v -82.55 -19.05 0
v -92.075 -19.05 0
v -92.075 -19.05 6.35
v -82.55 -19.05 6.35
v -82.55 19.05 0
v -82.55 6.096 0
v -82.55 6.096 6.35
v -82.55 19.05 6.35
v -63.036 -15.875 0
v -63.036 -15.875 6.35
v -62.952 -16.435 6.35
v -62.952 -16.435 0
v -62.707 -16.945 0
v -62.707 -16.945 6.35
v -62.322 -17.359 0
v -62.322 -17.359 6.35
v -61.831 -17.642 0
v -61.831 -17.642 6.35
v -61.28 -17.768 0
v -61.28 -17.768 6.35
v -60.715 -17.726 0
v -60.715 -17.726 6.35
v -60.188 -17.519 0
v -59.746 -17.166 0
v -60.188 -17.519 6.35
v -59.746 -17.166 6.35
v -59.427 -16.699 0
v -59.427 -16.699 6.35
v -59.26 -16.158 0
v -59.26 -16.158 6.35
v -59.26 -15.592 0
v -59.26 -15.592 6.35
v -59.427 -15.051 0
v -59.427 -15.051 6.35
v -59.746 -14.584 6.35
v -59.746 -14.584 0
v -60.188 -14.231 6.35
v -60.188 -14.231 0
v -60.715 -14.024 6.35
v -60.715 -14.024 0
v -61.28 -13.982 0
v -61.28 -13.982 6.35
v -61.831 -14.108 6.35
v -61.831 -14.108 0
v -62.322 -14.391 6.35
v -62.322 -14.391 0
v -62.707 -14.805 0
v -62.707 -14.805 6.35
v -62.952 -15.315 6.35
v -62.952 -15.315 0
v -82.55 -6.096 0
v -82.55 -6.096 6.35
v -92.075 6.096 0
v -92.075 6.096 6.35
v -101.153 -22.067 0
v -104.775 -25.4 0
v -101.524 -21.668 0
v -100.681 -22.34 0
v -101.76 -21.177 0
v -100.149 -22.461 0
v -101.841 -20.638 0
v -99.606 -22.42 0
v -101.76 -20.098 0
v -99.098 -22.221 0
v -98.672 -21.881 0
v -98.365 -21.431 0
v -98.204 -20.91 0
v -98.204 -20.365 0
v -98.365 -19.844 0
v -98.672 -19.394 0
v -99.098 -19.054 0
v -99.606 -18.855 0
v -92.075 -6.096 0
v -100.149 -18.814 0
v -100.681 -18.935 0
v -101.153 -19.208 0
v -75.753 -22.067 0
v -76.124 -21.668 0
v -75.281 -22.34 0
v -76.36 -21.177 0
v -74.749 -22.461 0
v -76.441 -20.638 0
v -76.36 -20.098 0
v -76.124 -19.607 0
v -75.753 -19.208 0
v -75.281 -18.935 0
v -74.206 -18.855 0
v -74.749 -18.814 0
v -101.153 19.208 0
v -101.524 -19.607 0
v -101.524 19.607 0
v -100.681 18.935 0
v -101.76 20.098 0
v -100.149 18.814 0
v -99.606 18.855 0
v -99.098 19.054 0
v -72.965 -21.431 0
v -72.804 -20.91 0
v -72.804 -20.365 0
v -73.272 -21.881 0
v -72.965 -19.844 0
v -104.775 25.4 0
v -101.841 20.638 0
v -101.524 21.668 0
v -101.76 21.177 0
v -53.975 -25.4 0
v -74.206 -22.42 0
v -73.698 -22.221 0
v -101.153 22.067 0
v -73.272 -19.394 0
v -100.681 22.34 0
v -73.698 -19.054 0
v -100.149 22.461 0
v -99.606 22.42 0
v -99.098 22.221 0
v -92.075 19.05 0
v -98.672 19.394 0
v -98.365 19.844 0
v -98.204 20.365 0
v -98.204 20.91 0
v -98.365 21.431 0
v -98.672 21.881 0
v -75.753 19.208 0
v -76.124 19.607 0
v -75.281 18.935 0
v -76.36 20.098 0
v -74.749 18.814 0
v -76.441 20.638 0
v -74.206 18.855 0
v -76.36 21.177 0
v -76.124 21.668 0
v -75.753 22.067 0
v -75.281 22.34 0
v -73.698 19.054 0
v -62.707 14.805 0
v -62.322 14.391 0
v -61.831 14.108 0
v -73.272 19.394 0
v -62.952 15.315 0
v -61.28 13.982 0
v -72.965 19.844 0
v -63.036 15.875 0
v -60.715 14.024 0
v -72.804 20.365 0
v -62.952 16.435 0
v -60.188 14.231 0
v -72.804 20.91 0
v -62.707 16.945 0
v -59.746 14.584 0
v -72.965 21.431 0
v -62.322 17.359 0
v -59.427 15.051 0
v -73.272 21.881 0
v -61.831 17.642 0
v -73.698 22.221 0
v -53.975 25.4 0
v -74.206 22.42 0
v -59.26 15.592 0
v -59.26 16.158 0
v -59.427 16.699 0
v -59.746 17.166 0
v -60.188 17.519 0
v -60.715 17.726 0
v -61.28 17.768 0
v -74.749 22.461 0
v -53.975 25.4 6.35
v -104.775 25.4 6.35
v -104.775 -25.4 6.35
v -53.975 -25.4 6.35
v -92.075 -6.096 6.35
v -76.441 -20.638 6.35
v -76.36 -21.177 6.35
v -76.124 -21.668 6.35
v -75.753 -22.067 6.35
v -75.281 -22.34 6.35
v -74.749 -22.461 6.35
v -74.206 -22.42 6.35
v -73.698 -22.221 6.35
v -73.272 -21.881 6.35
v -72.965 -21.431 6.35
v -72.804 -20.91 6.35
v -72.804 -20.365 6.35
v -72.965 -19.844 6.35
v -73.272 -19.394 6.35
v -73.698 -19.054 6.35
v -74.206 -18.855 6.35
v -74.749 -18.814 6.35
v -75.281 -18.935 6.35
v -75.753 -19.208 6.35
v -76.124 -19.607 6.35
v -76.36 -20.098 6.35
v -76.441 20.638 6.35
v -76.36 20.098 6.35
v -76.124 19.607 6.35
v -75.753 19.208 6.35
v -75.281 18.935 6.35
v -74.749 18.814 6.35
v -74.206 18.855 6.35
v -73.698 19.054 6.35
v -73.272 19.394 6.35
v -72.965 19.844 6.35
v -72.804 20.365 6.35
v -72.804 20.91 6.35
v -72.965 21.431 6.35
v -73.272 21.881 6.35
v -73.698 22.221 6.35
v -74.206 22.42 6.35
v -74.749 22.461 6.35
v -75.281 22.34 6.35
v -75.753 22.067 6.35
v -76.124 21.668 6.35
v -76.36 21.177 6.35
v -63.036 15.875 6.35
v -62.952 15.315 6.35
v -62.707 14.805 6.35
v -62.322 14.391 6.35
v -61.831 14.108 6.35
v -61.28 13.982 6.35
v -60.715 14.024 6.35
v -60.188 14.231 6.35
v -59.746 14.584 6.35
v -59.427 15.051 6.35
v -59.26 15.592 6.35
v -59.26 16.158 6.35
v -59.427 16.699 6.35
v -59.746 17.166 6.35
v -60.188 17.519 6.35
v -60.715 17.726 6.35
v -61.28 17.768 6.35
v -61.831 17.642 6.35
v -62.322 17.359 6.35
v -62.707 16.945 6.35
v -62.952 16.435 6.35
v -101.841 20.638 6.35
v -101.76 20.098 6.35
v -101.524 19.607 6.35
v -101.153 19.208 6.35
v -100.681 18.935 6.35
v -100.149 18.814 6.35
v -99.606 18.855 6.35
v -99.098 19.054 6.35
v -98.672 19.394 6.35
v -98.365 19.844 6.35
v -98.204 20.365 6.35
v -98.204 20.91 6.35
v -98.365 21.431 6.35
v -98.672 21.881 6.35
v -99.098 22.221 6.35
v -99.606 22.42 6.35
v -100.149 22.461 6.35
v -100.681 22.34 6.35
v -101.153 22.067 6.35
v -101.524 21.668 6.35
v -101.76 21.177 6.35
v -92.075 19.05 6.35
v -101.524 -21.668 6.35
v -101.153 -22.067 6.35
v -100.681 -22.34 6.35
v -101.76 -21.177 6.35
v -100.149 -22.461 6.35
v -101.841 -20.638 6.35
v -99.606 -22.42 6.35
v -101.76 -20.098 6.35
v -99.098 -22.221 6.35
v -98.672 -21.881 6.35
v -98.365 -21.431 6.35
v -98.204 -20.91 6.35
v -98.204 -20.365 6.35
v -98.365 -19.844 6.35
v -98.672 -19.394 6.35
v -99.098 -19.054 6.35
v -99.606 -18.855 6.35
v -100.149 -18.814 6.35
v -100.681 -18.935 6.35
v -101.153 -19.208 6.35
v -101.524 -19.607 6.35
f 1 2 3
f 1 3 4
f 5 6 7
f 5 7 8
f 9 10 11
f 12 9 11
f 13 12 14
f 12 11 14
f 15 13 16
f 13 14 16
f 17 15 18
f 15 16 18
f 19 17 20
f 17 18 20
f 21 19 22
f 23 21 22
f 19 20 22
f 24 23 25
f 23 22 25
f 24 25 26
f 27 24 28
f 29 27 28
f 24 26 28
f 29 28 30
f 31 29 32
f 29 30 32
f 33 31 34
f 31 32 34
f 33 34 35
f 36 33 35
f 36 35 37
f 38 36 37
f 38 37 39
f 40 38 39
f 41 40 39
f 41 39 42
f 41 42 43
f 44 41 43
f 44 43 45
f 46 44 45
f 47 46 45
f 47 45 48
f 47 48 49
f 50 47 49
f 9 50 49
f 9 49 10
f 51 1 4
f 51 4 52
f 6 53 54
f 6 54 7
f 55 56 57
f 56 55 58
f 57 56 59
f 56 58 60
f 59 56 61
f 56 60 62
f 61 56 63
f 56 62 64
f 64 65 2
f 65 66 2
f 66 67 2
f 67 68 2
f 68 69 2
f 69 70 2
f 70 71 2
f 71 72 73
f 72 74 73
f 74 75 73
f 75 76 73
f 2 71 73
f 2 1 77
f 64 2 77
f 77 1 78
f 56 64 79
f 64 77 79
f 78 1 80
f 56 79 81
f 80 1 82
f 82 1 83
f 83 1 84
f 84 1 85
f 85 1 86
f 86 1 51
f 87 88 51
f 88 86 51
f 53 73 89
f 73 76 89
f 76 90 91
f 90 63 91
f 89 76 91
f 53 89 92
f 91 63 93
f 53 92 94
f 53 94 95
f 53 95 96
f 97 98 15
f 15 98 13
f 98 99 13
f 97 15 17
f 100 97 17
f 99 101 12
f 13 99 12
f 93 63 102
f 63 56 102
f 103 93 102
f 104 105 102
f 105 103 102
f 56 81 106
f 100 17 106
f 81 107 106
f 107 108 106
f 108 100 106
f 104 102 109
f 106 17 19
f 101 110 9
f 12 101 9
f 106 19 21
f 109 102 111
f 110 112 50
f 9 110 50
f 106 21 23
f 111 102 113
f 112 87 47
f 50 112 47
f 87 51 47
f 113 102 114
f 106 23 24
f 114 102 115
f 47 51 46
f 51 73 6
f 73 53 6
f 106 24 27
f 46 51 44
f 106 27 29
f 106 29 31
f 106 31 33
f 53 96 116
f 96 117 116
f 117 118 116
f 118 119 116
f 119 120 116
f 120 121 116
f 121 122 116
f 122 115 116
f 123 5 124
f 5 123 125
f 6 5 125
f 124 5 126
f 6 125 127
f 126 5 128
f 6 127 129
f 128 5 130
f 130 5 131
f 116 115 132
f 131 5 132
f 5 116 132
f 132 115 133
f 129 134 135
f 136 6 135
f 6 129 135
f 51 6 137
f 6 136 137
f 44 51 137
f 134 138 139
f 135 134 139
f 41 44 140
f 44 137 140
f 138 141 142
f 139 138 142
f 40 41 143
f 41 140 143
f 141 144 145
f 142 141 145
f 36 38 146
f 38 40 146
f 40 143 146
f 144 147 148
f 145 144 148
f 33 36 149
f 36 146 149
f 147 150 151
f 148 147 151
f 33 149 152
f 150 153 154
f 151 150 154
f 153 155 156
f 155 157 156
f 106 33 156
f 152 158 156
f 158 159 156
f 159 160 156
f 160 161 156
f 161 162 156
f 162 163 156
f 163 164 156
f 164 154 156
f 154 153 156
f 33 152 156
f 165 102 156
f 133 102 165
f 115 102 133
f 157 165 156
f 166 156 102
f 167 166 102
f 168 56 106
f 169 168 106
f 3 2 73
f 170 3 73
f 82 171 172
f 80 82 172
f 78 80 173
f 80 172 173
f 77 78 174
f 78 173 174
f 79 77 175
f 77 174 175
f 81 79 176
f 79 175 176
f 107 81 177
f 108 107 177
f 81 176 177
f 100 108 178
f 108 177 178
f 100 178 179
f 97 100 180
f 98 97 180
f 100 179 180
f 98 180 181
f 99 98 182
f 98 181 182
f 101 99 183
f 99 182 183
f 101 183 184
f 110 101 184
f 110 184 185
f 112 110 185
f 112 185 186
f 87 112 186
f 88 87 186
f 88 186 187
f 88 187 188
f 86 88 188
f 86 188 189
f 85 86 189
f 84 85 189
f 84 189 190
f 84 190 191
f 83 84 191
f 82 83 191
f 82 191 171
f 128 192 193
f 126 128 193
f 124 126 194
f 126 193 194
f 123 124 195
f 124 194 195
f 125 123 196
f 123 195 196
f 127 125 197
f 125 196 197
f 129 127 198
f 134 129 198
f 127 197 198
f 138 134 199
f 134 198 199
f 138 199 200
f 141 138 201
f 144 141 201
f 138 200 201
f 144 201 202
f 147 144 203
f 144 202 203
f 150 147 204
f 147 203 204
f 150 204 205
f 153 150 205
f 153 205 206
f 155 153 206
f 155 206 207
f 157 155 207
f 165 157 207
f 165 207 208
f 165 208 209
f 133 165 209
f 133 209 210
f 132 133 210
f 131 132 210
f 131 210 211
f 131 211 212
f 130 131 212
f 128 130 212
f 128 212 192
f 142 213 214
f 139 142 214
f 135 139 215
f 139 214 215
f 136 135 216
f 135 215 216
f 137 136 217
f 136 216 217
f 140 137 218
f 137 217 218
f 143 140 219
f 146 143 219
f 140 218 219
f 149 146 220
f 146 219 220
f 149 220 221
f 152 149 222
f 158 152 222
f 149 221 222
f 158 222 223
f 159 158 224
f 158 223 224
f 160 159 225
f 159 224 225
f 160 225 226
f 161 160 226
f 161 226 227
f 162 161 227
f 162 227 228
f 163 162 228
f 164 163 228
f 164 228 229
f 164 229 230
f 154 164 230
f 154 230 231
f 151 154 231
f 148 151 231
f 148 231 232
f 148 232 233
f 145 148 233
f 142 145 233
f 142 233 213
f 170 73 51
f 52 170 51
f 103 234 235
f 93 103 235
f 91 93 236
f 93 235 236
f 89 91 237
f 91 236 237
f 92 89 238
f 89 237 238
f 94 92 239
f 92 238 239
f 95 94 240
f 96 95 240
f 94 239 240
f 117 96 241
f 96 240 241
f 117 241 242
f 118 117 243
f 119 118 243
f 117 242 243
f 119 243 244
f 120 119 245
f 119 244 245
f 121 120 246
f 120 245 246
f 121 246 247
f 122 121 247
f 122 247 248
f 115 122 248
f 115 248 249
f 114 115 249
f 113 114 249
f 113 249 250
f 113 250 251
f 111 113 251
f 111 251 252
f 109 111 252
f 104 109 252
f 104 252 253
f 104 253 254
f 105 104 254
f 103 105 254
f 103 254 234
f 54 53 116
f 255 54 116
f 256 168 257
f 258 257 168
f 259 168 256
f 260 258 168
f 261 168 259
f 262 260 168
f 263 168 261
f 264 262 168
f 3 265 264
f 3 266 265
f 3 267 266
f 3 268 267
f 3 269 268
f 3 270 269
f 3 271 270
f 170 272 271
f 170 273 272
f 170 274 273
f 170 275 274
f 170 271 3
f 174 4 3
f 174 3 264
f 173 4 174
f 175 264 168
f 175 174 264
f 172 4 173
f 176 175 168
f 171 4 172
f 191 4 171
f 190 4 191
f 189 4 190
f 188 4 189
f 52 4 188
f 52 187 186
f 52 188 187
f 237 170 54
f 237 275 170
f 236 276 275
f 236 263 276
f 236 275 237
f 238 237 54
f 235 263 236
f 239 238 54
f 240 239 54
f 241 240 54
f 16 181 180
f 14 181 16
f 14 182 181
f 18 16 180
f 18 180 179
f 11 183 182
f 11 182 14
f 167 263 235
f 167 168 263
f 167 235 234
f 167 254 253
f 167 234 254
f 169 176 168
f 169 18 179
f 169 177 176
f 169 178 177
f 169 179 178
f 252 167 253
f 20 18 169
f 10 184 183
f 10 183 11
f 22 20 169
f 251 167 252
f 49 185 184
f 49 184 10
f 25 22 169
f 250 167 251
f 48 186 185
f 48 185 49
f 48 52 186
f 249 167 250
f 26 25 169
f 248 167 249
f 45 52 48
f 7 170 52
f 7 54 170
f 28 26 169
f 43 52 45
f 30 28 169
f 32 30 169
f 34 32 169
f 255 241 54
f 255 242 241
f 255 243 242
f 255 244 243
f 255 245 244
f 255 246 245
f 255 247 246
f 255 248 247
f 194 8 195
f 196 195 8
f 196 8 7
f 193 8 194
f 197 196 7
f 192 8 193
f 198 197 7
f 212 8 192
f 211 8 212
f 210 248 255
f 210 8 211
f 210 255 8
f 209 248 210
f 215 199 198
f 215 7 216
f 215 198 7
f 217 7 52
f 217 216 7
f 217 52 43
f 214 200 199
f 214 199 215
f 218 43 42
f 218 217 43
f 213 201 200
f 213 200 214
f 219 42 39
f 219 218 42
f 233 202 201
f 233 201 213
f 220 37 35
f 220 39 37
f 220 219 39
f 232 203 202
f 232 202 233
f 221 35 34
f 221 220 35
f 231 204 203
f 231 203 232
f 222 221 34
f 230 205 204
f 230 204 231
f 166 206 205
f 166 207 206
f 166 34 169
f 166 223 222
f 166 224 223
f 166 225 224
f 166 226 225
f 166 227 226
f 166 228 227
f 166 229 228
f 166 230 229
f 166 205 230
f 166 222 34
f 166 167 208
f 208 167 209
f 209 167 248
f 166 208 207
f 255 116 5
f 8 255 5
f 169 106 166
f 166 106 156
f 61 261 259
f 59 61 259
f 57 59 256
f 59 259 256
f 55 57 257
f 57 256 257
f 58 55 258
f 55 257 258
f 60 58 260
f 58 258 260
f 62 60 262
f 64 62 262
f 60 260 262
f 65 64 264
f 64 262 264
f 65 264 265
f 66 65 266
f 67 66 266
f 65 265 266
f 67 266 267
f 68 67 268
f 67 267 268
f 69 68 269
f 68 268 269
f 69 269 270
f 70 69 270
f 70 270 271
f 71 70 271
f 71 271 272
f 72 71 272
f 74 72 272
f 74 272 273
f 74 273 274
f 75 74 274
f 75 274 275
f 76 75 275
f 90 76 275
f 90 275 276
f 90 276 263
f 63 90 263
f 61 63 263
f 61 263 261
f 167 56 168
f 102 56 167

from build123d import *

# Parameters (mm, degrees)
F0_W     = 34.925
F0_H     = 50.8
F0_R     = 1.8288
F0_W_2   = 9.525
F0_H_2   = 12.954
F0_W_3   = 15.875
F0_R_2   = 1.5875
F1_DEPTH = 6.35
F2_D     = 3.6576
F3_D     = 3.7973


with BuildPart() as f1:
    # F0 (on Top) → F1 (new body)
    with BuildSketch(Plane.XY):
        with Locations((-87.3125, 0)):
            Rectangle(F0_W, F0_H)
        with Locations((-100.0125, -20.6375)):
            Circle(F0_R, mode=Mode.SUBTRACT)
        with Locations((-87.3125, -12.573)):
            Rectangle(F0_W_2, F0_H_2, mode=Mode.SUBTRACT)
        with Locations((-74.6125, -20.6375)):
            Circle(F0_R, mode=Mode.SUBTRACT)
        with Locations((-87.3125, 12.573)):
            Rectangle(F0_W_2, F0_H_2, mode=Mode.SUBTRACT)
        with Locations((-100.0125, 20.6375)):
            Circle(F0_R, mode=Mode.SUBTRACT)
        with Locations((-74.6125, 20.6375)):
            Circle(F0_R, mode=Mode.SUBTRACT)
        with Locations((-61.9125, 0)):
            Rectangle(F0_W_3, F0_H)
        with Locations((-61.1378, -15.875)):
            Circle(F0_R_2, mode=Mode.SUBTRACT)
        with Locations((-61.1378, 15.875)):
            Circle(F0_R_2, mode=Mode.SUBTRACT)
        with Locations((-100.0125, -20.6375)):
            Circle(F0_R)
        with Locations((-100.0125, 20.6375)):
            Circle(F0_R)
        with Locations((-74.6125, 20.6375)):
            Circle(F0_R)
        with Locations((-74.6125, -20.6375)):
            Circle(F0_R)
        with Locations((-61.1378, 15.875)):
            Circle(F0_R_2)
        with Locations((-61.1378, -15.875)):
            Circle(F0_R_2)
    extrude(amount=F1_DEPTH)

    # F2 (through all)
    with Locations(Plane(origin=(0, 0, 0), x_dir=(1, 0, 0), z_dir=(0, 0, -1))):
        with Locations((-100.0125, -20.6375), (-74.6125, -20.6375), (-74.6125, 20.6375), (-100.0125, 20.6375)):
            Hole(F2_D / 2)

    # F3 (through all)
    with Locations(Plane(origin=(0, 0, 0), x_dir=(1, 0, 0), z_dir=(0, 0, -1))):
        with Locations((-61.1378, 15.875), (-61.1378, -15.875)):
            Hole(F3_D / 2)


solid = f1.part
